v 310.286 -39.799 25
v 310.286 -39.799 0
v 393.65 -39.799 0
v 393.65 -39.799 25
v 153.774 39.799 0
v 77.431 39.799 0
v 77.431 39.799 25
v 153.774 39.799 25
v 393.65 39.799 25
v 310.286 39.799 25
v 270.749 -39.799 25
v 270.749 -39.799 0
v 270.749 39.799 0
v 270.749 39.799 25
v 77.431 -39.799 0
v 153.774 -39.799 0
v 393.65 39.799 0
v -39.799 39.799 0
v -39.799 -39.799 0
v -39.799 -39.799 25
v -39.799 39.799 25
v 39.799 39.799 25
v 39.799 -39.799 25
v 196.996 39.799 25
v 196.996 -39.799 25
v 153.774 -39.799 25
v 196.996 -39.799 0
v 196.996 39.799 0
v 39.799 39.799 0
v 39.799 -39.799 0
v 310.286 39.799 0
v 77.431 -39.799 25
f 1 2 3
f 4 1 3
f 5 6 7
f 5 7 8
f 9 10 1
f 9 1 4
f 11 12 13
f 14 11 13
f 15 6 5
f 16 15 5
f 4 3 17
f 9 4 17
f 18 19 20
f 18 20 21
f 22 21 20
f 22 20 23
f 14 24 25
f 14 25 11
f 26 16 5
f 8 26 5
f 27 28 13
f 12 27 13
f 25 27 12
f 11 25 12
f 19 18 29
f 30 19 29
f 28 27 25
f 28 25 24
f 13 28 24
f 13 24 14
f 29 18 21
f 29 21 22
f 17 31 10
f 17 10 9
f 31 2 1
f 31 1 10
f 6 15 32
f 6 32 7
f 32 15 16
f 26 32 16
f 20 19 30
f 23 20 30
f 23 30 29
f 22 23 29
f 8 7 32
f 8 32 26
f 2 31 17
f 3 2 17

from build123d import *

# Parameters (mm, degrees)
F0_W     = 79.59804
F0_H     = 79.59804
F0_W_2   = 76.342359
F0_W_3   = 73.753029
F0_W_4   = 83.363891
F1_DEPTH = 25


with BuildPart() as f1:
    # F0 (on Top) → F1 (new body)
    with BuildSketch(Plane.XY):
        Rectangle(F0_W, F0_H)
        with Locations((115.602411, 0)):
            Rectangle(F0_W_2, F0_H)
        with Locations((233.872845, 0)):
            Rectangle(F0_W_3, F0_H)
        with Locations((351.96814, 0)):
            Rectangle(F0_W_4, F0_H)
    extrude(amount=F1_DEPTH)


solid = f1.part
